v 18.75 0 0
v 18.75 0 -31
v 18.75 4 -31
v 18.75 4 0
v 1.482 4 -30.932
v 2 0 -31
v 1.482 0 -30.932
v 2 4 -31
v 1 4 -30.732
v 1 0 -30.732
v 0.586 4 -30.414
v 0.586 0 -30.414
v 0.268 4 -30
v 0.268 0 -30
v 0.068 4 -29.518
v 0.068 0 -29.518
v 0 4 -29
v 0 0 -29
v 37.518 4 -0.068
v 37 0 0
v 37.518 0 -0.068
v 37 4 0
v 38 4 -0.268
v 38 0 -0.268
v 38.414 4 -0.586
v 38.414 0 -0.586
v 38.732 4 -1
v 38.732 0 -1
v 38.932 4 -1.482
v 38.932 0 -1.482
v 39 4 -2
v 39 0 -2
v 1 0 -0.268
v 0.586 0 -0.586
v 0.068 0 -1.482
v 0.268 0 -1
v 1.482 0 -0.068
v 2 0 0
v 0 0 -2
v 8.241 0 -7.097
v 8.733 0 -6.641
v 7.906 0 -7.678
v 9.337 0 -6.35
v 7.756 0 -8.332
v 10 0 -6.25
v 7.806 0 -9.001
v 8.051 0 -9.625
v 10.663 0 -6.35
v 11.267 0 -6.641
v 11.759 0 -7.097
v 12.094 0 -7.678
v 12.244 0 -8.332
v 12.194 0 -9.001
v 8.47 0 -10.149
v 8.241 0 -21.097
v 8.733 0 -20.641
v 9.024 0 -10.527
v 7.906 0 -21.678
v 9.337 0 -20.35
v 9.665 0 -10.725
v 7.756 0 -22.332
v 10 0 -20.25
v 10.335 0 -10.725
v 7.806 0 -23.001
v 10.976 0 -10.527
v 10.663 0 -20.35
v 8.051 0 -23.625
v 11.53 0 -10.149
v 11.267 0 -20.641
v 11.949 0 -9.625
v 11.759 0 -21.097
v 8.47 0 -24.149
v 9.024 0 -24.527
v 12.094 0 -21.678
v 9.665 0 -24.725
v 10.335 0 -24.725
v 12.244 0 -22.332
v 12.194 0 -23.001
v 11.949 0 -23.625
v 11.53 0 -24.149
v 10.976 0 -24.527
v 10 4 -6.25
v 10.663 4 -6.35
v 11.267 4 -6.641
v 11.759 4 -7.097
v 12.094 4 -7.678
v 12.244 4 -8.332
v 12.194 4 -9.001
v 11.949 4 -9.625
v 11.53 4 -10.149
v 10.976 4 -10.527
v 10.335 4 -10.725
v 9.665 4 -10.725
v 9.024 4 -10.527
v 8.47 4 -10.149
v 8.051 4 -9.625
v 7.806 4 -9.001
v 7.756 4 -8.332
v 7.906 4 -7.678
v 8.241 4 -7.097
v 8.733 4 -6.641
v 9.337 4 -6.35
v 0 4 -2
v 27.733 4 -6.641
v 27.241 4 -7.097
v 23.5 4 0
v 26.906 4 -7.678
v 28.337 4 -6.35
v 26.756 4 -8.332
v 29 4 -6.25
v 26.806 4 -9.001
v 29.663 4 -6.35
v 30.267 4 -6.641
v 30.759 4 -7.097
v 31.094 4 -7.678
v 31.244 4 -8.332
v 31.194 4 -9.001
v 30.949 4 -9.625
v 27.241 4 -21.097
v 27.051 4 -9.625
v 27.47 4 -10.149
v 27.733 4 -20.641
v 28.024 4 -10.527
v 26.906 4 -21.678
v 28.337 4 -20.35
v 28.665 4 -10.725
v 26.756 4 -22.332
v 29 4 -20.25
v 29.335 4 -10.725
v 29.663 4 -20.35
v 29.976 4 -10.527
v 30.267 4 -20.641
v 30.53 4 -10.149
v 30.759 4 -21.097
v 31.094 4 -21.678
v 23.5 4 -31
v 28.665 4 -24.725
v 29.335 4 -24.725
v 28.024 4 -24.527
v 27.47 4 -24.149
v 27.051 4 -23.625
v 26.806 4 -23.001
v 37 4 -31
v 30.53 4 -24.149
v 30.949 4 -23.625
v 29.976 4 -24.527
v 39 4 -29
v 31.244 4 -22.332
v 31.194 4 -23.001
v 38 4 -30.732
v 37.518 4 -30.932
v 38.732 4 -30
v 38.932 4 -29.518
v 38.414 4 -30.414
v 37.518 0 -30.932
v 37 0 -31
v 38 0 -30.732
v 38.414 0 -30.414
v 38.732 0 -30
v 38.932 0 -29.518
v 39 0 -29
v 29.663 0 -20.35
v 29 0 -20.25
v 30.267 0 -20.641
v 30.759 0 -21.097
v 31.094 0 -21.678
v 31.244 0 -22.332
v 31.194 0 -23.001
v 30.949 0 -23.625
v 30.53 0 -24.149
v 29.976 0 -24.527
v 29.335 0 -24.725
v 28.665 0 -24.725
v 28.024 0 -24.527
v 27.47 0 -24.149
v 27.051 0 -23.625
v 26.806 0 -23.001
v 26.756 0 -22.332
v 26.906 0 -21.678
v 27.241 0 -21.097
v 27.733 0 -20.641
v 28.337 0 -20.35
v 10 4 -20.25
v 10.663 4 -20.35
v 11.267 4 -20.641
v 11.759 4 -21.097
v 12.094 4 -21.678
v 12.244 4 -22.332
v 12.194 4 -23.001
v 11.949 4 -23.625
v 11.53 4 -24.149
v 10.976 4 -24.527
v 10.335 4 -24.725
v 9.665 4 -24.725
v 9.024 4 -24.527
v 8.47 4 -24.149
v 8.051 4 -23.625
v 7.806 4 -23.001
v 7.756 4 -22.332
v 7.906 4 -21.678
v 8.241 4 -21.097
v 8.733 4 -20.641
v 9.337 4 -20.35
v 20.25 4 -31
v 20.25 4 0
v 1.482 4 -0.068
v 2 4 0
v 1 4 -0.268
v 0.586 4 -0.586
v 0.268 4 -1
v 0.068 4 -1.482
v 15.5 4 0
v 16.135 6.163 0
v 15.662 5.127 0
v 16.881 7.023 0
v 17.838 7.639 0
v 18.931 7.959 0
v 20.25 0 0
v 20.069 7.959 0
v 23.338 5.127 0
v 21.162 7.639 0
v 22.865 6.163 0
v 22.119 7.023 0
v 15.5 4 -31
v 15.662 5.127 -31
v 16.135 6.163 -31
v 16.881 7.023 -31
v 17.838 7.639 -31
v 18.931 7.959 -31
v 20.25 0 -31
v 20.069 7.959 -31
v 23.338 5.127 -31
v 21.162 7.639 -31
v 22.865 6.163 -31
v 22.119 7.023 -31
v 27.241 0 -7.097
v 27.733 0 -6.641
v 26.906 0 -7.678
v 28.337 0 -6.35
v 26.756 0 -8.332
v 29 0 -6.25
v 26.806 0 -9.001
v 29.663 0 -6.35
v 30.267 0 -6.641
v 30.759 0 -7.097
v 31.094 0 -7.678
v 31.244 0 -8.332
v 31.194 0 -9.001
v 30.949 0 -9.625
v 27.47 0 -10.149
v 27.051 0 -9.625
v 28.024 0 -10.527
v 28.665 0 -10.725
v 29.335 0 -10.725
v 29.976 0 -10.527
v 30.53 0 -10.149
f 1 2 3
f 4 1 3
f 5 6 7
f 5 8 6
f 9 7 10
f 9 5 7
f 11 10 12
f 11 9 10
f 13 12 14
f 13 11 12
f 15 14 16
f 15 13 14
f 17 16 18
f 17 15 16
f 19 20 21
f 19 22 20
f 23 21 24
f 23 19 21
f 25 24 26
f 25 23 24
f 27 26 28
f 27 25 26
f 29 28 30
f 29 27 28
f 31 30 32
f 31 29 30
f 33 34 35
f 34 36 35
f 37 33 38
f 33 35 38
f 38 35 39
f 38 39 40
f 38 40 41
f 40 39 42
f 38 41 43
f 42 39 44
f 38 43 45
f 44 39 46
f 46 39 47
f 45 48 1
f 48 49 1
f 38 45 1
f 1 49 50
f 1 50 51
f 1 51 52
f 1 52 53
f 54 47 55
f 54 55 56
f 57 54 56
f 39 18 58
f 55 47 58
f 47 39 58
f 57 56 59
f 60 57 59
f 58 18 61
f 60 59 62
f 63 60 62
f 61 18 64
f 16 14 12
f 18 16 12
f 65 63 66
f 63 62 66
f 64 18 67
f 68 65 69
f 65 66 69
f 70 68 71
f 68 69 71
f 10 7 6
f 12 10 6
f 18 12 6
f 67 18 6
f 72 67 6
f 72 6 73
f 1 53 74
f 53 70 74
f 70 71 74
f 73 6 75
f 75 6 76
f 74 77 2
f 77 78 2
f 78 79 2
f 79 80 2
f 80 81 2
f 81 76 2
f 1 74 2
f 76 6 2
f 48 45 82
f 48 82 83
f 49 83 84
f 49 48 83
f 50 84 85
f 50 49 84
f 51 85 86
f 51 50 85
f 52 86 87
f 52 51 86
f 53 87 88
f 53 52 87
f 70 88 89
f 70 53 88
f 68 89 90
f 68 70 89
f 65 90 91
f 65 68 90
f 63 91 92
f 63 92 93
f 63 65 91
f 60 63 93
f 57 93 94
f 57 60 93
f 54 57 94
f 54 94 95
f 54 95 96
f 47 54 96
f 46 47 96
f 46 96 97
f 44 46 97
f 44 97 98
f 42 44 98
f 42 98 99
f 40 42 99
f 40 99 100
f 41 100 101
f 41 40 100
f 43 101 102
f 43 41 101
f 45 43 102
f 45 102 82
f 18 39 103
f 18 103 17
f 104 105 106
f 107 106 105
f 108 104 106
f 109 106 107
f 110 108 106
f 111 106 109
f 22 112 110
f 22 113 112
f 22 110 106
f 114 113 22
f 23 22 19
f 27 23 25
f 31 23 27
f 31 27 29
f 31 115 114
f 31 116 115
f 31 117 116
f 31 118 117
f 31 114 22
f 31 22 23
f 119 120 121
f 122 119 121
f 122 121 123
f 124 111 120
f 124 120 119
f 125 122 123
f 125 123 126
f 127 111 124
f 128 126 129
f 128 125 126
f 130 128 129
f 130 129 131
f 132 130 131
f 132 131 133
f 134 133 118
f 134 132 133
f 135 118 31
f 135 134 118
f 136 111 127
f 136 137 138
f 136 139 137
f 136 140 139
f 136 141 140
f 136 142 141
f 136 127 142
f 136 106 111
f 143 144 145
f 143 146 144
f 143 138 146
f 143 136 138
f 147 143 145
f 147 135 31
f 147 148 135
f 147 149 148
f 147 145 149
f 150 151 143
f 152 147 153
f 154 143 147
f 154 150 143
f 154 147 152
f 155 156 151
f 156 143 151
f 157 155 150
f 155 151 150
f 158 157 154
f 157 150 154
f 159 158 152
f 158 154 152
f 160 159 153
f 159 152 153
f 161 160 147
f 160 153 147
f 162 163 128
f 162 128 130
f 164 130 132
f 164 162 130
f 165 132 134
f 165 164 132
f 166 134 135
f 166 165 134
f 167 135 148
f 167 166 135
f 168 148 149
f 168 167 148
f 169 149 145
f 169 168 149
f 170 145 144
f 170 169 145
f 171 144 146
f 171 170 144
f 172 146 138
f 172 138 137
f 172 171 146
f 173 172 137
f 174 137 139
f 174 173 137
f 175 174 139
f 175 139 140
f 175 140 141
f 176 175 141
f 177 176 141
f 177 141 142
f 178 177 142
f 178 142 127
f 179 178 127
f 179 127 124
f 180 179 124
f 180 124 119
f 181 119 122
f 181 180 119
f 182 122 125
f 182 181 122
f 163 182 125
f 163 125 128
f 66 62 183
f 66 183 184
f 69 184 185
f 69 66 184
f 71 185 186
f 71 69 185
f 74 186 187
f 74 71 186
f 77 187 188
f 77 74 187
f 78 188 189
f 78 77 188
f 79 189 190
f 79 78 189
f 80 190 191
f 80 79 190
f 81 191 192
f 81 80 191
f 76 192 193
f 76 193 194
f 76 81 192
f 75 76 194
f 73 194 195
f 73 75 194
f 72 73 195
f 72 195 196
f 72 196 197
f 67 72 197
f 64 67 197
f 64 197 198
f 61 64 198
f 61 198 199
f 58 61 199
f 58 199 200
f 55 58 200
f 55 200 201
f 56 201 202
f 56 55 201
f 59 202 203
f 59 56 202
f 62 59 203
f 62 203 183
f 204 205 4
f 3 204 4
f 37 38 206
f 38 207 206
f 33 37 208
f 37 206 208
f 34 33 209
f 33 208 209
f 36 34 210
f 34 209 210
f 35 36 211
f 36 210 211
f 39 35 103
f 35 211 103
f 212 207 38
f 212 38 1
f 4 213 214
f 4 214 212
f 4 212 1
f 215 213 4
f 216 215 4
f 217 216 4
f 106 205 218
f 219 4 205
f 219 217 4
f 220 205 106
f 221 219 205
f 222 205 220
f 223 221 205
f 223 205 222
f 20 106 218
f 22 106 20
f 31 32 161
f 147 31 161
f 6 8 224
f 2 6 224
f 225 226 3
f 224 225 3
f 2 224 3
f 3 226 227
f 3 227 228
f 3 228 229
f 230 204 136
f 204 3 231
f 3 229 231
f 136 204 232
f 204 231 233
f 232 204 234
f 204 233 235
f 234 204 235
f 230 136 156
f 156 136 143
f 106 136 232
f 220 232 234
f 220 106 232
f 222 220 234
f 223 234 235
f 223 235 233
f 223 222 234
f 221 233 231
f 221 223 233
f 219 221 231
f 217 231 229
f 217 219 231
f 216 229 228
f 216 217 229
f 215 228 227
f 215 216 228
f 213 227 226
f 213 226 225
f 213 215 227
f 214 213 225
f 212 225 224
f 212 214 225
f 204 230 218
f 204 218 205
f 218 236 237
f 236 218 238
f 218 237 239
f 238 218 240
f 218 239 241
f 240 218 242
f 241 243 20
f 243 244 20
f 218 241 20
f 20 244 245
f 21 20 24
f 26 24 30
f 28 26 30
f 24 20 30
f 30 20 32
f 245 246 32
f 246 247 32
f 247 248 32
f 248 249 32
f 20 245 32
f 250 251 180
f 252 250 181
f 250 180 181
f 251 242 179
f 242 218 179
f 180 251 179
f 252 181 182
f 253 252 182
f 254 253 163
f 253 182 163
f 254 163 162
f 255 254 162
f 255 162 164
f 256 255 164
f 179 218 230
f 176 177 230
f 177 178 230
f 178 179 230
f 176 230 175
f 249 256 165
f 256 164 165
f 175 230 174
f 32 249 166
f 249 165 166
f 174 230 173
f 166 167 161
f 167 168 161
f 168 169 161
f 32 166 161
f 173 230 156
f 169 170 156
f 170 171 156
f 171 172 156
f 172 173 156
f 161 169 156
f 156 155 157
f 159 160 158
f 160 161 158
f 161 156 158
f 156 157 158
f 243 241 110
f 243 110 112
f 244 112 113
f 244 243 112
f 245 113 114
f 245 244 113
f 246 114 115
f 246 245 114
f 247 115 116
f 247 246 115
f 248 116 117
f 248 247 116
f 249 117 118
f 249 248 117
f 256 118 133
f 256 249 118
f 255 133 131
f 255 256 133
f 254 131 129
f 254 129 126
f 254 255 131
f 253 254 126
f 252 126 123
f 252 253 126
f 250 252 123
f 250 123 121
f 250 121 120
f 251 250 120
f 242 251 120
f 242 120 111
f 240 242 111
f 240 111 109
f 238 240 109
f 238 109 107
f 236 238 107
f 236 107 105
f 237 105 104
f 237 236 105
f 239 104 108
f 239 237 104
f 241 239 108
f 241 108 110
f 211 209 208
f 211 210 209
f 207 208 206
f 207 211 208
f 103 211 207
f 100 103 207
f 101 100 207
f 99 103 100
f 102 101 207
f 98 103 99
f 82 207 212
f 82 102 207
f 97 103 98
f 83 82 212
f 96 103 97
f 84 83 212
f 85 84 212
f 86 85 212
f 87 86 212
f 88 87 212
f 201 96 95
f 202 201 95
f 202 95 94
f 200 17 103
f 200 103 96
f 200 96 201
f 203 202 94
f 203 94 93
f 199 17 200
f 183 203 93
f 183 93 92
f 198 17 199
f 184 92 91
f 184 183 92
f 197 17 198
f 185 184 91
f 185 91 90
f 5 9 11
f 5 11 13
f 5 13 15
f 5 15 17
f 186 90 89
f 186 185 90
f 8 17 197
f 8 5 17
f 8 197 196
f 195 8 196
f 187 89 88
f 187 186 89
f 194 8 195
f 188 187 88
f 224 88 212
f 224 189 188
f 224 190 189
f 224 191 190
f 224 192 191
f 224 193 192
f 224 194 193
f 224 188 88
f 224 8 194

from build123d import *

# Parameters (mm, degrees)
CROQUIS1_W              = 39
CROQUIS1_H              = 31
CROQUIS1_R              = 2.25
SALIENTE_EXTRUIR1_DEPTH = 4
CROQUIS2_R              = 4
SALIENTE_EXTRUIR2_DEPTH = 31
CROQUIS3_W              = 1.5
CROQUIS3_H              = 4
CORTAR_EXTRUIR1_DEPTH   = 31
REDONDEO1_R             = 2


with BuildPart() as part:
    # Croquis1 → Saliente-Extruir1 (new body)
    with BuildSketch(Plane(origin=(0, 0, 0), x_dir=(1, 0, 0), z_dir=(0, 1, 0))):
        with Locations((19.5, 15.5)):
            Rectangle(CROQUIS1_W, CROQUIS1_H)
        with Locations(Location((10, 22.5, 0), (0, 0, 270))):
            Circle(CROQUIS1_R, mode=Mode.SUBTRACT)
        with Locations(Location((29, 22.5, 0), (0, 0, 270))):
            Circle(CROQUIS1_R, mode=Mode.SUBTRACT)
        with Locations(Location((29, 8.5, 0), (0, 0, 270))):
            Circle(CROQUIS1_R, mode=Mode.SUBTRACT)
        with Locations(Location((10, 8.5, 0), (0, 0, 270))):
            Circle(CROQUIS1_R, mode=Mode.SUBTRACT)
    extrude(amount=SALIENTE_EXTRUIR1_DEPTH)

    # Croquis2 → Saliente-Extruir2 (add)
    with BuildSketch(Plane.XY):
        with Locations((19.5, 4)):
            Circle(CROQUIS2_R)
    extrude(amount=-SALIENTE_EXTRUIR2_DEPTH)

    # Croquis3 → Cortar-Extruir1 (cut)
    with BuildSketch(Plane(origin=(0, 0, -31), x_dir=(-1, 0, 0), z_dir=(0, 0, -1))):
        with Locations((-19.5, 2)):
            Rectangle(CROQUIS3_W, CROQUIS3_H)
    extrude(amount=-CORTAR_EXTRUIR1_DEPTH, mode=Mode.SUBTRACT)

    # Redondeo1
    redondeo1_edges = [part.edges().sort_by_distance(p)[0] for p in [
        (0, 2, -31),
        (39, 2, -31),
        (39, 2, 0),
        (0, 2, 0),
    ]]
    fillet(redondeo1_edges, radius=REDONDEO1_R)


solid = part.part
